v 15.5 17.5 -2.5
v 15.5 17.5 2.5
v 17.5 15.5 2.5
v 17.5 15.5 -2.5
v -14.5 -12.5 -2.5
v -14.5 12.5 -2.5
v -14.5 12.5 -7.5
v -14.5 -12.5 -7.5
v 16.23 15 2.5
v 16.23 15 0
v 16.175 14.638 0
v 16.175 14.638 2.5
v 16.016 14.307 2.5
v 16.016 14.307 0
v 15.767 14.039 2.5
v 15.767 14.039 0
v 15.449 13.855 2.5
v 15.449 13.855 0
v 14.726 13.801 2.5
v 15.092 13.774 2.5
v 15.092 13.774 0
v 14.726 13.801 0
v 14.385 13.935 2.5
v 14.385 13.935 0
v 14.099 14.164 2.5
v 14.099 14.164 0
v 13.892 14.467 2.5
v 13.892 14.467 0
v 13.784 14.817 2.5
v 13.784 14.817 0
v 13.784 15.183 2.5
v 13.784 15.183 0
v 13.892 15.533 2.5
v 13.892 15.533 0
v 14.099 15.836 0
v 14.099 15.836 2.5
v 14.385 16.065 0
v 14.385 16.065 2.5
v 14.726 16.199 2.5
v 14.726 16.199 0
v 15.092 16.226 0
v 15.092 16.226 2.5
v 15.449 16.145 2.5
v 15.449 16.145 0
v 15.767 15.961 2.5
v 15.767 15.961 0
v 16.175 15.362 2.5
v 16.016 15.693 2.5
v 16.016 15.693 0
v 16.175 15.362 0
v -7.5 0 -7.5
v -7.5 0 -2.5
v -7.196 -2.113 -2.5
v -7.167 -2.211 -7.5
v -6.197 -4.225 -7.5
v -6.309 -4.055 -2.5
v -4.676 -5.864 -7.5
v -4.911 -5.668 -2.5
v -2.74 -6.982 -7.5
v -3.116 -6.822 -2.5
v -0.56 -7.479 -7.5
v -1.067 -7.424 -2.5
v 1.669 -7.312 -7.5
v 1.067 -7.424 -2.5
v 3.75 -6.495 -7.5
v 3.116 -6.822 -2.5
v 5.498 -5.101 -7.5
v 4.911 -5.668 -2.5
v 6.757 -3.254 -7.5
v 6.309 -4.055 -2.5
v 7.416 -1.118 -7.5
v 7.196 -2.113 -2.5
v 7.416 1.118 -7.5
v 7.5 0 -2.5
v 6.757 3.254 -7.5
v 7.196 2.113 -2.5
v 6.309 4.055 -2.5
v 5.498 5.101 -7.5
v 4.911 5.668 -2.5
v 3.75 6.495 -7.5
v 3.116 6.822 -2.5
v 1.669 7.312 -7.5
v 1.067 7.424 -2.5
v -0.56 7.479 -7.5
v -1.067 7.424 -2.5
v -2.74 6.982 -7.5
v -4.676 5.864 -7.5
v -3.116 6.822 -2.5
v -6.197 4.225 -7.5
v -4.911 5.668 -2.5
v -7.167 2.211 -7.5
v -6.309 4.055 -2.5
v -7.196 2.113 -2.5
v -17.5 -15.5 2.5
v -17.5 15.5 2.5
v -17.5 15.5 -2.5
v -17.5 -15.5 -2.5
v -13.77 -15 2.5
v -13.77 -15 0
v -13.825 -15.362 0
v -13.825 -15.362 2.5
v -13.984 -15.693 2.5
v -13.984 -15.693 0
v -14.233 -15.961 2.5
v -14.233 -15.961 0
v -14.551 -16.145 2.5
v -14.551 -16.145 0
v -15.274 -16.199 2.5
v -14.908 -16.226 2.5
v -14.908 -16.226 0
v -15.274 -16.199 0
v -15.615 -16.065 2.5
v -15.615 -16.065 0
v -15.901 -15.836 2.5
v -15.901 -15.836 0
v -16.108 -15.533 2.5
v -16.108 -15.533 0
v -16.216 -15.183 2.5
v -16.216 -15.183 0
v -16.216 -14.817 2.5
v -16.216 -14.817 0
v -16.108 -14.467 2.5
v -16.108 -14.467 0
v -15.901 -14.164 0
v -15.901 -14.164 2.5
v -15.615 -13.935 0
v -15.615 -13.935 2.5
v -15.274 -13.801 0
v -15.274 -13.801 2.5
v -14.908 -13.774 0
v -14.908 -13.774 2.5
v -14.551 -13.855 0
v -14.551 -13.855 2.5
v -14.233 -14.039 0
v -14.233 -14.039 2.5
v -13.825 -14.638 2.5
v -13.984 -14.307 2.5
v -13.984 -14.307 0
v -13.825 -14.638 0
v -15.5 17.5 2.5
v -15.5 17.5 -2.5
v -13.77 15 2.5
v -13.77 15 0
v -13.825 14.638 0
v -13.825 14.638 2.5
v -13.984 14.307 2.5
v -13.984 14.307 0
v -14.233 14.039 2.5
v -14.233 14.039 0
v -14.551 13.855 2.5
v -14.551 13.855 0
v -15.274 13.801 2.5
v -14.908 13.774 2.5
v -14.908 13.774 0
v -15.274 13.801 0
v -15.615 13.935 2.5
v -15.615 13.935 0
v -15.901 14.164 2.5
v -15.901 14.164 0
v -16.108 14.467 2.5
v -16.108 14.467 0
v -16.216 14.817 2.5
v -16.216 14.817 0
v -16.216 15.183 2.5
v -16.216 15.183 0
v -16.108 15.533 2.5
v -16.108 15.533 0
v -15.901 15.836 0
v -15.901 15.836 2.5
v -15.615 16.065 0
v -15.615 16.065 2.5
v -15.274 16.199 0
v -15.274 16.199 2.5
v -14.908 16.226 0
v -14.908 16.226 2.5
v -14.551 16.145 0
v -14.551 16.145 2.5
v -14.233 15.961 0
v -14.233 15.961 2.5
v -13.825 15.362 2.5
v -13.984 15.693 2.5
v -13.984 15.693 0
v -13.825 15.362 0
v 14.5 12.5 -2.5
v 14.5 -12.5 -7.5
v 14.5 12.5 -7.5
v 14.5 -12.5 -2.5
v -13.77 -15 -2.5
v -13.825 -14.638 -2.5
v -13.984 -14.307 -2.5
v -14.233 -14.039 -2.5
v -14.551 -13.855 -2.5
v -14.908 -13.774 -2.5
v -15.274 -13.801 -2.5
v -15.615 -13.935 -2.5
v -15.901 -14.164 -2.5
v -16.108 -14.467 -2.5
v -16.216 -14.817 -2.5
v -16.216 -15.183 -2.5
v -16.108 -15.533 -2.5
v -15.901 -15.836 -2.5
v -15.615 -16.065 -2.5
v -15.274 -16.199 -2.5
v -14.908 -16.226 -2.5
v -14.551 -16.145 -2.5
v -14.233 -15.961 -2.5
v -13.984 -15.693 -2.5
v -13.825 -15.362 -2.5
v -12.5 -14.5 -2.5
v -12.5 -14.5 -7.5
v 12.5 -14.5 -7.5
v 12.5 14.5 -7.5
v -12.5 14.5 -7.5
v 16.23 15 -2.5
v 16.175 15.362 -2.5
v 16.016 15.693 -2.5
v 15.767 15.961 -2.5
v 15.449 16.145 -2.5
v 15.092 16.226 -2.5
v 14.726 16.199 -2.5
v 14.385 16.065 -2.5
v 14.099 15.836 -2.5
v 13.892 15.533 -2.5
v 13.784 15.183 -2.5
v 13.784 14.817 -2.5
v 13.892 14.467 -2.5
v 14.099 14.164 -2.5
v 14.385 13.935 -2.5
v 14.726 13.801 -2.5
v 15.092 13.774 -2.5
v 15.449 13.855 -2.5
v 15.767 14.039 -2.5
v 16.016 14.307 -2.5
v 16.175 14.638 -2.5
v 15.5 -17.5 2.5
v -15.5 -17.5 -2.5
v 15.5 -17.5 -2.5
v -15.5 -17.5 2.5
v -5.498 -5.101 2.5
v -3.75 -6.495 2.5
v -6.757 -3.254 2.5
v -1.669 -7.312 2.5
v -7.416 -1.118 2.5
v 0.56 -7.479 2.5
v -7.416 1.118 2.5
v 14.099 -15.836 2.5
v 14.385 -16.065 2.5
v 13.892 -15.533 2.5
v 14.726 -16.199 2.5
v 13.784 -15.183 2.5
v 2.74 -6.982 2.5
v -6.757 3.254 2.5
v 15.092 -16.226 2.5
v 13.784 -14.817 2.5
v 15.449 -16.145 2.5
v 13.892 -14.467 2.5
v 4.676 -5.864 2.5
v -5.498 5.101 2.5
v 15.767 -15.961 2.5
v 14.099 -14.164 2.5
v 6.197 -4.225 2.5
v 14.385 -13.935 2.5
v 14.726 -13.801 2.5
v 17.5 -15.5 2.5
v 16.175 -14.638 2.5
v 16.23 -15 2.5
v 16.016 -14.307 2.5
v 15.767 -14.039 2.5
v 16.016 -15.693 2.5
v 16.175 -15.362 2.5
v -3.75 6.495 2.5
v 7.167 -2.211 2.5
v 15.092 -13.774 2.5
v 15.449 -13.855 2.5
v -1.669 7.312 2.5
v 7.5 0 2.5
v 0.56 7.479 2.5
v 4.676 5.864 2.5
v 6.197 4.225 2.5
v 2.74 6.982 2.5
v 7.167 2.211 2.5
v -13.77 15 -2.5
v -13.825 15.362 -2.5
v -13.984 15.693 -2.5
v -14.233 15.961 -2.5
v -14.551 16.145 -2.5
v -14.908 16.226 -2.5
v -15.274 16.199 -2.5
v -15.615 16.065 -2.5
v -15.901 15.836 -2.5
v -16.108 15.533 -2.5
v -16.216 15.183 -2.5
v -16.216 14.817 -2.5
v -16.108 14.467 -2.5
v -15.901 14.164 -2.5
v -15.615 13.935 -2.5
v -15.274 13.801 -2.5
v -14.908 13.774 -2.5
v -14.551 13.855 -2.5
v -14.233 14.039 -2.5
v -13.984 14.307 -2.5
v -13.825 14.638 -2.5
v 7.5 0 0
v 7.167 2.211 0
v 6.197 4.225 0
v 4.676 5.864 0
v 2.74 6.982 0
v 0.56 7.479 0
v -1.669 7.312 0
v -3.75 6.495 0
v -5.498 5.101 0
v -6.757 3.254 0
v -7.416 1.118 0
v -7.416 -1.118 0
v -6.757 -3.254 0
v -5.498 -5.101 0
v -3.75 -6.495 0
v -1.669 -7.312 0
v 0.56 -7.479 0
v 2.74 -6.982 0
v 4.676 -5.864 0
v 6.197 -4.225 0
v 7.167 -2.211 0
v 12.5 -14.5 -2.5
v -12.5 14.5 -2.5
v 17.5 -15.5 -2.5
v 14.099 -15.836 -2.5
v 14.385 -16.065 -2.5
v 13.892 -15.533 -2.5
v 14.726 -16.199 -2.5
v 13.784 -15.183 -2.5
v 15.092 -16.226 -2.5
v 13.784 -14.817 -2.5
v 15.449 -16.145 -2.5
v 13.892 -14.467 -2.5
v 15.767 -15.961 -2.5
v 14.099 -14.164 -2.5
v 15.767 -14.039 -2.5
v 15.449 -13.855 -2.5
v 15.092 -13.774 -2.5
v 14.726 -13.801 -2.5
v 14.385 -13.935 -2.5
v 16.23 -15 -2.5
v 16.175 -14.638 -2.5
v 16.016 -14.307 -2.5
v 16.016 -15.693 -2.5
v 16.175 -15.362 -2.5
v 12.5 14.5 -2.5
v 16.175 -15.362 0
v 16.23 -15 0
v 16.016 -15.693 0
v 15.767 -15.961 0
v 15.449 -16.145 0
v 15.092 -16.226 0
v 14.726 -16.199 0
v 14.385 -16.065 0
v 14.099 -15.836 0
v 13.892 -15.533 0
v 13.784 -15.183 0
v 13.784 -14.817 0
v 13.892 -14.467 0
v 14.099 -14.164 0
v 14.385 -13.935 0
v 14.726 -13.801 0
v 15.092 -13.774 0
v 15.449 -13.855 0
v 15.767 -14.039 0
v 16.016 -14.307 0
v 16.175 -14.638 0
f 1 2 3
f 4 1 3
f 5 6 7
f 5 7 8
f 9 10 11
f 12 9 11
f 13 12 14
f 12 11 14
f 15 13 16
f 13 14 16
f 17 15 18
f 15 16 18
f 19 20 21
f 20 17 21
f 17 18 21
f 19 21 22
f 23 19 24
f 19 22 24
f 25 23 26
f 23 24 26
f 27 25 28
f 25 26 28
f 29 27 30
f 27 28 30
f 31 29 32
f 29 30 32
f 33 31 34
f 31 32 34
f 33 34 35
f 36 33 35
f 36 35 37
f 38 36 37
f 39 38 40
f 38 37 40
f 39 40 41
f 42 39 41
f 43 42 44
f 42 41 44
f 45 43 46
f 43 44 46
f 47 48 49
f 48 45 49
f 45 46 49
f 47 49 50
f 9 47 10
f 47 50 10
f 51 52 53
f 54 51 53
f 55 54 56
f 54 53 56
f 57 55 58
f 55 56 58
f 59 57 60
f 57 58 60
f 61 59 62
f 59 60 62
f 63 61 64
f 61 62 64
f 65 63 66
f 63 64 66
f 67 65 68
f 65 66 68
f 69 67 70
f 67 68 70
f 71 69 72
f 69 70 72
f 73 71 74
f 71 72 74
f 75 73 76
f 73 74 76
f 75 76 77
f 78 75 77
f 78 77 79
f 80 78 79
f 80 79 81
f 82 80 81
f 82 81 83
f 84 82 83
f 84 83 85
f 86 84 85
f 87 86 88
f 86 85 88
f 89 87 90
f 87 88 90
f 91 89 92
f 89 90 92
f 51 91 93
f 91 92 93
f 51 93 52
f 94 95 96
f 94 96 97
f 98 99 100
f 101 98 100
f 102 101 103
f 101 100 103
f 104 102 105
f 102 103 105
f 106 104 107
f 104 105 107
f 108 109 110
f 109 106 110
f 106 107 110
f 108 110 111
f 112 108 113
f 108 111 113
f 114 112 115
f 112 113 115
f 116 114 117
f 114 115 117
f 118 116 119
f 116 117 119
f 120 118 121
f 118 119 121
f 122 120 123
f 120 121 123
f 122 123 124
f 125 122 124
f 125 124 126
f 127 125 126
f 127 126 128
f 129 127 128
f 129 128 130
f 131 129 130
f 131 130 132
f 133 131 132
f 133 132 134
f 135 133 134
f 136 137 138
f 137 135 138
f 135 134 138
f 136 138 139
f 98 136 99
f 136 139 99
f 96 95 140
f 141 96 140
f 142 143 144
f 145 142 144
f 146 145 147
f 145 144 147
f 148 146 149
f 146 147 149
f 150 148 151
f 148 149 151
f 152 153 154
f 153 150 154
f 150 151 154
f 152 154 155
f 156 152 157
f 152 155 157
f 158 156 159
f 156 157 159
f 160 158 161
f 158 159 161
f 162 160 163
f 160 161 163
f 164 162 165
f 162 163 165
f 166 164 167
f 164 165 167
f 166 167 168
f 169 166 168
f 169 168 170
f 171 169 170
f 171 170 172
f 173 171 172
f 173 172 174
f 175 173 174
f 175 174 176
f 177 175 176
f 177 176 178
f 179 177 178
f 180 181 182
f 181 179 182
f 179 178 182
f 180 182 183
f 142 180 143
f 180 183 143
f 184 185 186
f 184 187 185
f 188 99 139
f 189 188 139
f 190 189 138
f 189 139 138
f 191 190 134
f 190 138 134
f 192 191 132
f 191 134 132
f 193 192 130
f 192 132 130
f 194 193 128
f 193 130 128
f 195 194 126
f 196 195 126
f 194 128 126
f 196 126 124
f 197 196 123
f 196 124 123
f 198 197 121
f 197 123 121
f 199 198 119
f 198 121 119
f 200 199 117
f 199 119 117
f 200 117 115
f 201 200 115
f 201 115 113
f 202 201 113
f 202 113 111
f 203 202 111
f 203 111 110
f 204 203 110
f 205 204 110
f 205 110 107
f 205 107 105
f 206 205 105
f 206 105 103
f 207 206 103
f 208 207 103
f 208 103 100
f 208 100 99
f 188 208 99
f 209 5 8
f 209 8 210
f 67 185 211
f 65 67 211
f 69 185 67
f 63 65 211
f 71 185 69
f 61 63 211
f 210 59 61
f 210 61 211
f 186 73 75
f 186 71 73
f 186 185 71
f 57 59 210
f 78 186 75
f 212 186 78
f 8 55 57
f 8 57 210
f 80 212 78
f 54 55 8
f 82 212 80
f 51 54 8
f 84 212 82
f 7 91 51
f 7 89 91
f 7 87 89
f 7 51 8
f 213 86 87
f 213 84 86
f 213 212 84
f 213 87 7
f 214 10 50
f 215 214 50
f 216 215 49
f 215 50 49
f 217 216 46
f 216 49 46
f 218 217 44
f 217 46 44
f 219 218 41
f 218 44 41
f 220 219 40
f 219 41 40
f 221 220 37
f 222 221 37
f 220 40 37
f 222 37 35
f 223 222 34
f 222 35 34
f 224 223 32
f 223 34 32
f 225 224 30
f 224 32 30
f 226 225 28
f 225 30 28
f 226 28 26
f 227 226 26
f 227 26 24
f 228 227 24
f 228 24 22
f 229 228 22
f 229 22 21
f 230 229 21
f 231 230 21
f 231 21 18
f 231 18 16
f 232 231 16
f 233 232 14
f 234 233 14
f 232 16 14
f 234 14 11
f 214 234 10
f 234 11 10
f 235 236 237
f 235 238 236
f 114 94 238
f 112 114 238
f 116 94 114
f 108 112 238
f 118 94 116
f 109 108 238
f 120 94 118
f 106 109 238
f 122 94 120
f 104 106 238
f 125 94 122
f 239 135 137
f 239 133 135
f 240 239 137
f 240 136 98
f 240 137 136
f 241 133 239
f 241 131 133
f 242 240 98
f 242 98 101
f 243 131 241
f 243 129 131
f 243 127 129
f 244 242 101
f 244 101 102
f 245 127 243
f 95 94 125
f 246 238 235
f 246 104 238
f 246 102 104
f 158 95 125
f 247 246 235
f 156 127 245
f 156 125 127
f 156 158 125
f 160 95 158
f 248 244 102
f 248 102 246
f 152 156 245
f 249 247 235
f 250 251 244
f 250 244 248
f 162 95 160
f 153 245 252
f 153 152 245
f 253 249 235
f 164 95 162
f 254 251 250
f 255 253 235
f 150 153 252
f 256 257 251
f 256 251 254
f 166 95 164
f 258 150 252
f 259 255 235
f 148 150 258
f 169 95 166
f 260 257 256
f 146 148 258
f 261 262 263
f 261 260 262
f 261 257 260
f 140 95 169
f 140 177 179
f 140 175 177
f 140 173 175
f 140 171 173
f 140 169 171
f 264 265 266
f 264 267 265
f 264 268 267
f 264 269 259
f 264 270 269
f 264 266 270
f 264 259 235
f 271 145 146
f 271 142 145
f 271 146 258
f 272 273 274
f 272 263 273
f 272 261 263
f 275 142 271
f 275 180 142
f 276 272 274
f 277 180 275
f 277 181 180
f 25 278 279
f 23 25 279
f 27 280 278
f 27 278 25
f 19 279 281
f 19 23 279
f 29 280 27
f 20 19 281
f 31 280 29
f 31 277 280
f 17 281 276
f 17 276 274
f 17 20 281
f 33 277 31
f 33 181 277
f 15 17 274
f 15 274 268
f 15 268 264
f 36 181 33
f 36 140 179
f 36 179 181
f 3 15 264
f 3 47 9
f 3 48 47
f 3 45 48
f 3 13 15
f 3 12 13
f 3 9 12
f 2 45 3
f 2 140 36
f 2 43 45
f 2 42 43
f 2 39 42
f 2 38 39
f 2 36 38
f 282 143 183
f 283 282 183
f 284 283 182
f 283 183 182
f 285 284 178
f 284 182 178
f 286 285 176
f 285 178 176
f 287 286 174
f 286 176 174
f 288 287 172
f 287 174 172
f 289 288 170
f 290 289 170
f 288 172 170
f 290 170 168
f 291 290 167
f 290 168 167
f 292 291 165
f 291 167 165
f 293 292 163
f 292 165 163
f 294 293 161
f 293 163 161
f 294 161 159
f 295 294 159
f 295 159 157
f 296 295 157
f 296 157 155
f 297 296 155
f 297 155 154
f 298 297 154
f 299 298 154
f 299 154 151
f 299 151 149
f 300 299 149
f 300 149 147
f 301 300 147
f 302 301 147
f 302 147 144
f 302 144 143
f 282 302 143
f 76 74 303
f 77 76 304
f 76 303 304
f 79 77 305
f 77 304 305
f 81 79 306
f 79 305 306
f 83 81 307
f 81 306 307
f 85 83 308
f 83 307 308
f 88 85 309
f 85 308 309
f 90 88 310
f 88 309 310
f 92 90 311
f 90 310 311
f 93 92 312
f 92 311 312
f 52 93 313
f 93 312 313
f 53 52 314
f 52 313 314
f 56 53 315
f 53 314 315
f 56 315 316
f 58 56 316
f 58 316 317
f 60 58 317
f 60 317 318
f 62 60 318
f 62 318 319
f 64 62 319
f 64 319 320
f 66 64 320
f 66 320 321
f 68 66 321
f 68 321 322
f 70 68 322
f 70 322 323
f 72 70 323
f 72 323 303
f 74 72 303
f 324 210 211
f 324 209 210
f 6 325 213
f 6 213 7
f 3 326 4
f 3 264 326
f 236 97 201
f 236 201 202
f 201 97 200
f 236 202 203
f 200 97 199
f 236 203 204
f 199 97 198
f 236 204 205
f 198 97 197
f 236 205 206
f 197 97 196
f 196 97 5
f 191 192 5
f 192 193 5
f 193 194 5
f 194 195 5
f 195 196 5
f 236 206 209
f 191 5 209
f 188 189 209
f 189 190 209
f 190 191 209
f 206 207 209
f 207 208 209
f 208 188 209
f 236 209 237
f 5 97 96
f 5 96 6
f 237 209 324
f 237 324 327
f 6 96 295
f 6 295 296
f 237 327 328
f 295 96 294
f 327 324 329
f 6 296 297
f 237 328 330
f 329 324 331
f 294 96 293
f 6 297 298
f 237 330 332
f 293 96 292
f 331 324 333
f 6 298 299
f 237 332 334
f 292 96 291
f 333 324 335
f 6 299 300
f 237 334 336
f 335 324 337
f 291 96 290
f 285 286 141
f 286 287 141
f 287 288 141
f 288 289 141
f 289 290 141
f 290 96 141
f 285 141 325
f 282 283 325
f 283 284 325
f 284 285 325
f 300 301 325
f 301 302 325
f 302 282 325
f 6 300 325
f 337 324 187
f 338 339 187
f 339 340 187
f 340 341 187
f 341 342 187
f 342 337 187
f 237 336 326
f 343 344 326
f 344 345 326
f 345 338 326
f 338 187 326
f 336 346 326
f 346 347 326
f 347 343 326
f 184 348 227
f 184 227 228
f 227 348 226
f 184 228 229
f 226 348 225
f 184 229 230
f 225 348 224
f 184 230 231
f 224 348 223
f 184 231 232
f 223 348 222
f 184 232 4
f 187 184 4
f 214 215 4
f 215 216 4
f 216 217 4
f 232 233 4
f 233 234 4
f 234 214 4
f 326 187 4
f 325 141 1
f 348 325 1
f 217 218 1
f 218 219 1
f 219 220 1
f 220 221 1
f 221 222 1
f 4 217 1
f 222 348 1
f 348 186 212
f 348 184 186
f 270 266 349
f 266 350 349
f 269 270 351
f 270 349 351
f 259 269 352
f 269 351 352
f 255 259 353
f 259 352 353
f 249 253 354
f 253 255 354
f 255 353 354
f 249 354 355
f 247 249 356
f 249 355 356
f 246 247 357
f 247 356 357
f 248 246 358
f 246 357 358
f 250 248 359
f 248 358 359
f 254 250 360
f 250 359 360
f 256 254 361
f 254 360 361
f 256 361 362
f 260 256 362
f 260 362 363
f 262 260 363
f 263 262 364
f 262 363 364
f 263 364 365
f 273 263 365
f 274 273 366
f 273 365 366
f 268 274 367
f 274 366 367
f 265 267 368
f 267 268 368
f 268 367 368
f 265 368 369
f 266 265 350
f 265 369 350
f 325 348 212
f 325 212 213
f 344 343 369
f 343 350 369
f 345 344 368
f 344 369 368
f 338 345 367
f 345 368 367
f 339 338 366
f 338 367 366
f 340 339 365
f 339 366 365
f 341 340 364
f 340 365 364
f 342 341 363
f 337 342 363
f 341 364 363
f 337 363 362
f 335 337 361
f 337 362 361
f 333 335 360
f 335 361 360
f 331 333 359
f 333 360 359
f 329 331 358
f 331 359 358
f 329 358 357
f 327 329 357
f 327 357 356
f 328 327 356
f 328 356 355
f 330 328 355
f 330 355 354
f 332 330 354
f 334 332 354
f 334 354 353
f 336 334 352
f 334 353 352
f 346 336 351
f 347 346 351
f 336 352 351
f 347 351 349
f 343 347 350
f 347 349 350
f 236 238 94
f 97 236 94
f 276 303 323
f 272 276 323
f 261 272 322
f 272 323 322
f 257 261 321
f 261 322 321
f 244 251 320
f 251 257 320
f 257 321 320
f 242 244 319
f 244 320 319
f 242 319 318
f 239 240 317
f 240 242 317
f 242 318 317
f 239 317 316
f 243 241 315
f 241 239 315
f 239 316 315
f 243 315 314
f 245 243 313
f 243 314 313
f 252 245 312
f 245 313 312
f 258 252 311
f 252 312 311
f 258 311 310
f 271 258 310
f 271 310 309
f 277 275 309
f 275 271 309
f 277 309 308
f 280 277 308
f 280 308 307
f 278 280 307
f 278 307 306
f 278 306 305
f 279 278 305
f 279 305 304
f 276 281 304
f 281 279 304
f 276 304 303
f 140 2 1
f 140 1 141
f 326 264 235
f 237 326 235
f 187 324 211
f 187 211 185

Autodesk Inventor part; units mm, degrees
ref_plane "YZ Plane" through (0, 0, 0) normal (1, 0, 0) x (0, 1, 0)
ref_plane "XZ Plane" through (0, 0, 0) normal (0, 1, 0) x (-1, 0, 0)
ref_plane "XY Plane" through (0, 0, 0) normal (0, 0, 1) x (1, 0, 0)
sketch "Sketch5" plane through (0, 0, 0) normal (0, 0, 1) x (1, 0, 0)
  circle A0 centre (15, -15) radius 1.2295
  circle A1 centre (-15, 15) radius 1.2295
  circle A2 centre (15, 15) radius 1.2295
  circle A3 centre (-15, -15) radius 1.2295
  line L0 (-15.5, -17.5) -> (-17.5, -15.5)
  line L1 (-15.5, -17.5) -> (15.5, -17.5)
  line L2 (17.5, -15.5) -> (15.5, -17.5)
  line L3 (17.5, -15.5) -> (17.5, 15.5)
  line L4 (15.5, 17.5) -> (17.5, 15.5)
  line L5 (15.5, 17.5) -> (-15.5, 17.5)
  line L6 (-17.5, 15.5) -> (-15.5, 17.5)
  line L7 (-17.5, 15.5) -> (-17.5, -15.5)
  circle A4 centre (0, 0) radius 7.5
  dimension "d59" = 15
extrude "Extrusion4" add sketch "Sketch5" against normal mid plane 5
sketch "Sketch6" plane through (0, 0, -2.5) normal (0, 0, -1) x (-1, 0, 0)
  line L0 (14.5, 12.5) -> (14.5, -12.5)
  line L1 (12.5, 14.5) -> (14.5, 12.5)
  line L2 (-12.5, 14.5) -> (12.5, 14.5)
  line L3 (-14.5, 12.5) -> (-12.5, 14.5)
  line L4 (-14.5, -12.5) -> (-14.5, 12.5)
  line L5 (-12.5, -14.5) -> (-14.5, -12.5)
  line L6 (12.5, -14.5) -> (-12.5, -14.5)
  line L7 (14.5, -12.5) -> (12.5, -14.5)
  circle A0 centre (0, 0) radius 7.5 projected
extrude "Extrusion5" add sketch "Sketch6" along normal blind 5
properties part number "Front cover for servo motor 250 W" material "PBT Plastic"
